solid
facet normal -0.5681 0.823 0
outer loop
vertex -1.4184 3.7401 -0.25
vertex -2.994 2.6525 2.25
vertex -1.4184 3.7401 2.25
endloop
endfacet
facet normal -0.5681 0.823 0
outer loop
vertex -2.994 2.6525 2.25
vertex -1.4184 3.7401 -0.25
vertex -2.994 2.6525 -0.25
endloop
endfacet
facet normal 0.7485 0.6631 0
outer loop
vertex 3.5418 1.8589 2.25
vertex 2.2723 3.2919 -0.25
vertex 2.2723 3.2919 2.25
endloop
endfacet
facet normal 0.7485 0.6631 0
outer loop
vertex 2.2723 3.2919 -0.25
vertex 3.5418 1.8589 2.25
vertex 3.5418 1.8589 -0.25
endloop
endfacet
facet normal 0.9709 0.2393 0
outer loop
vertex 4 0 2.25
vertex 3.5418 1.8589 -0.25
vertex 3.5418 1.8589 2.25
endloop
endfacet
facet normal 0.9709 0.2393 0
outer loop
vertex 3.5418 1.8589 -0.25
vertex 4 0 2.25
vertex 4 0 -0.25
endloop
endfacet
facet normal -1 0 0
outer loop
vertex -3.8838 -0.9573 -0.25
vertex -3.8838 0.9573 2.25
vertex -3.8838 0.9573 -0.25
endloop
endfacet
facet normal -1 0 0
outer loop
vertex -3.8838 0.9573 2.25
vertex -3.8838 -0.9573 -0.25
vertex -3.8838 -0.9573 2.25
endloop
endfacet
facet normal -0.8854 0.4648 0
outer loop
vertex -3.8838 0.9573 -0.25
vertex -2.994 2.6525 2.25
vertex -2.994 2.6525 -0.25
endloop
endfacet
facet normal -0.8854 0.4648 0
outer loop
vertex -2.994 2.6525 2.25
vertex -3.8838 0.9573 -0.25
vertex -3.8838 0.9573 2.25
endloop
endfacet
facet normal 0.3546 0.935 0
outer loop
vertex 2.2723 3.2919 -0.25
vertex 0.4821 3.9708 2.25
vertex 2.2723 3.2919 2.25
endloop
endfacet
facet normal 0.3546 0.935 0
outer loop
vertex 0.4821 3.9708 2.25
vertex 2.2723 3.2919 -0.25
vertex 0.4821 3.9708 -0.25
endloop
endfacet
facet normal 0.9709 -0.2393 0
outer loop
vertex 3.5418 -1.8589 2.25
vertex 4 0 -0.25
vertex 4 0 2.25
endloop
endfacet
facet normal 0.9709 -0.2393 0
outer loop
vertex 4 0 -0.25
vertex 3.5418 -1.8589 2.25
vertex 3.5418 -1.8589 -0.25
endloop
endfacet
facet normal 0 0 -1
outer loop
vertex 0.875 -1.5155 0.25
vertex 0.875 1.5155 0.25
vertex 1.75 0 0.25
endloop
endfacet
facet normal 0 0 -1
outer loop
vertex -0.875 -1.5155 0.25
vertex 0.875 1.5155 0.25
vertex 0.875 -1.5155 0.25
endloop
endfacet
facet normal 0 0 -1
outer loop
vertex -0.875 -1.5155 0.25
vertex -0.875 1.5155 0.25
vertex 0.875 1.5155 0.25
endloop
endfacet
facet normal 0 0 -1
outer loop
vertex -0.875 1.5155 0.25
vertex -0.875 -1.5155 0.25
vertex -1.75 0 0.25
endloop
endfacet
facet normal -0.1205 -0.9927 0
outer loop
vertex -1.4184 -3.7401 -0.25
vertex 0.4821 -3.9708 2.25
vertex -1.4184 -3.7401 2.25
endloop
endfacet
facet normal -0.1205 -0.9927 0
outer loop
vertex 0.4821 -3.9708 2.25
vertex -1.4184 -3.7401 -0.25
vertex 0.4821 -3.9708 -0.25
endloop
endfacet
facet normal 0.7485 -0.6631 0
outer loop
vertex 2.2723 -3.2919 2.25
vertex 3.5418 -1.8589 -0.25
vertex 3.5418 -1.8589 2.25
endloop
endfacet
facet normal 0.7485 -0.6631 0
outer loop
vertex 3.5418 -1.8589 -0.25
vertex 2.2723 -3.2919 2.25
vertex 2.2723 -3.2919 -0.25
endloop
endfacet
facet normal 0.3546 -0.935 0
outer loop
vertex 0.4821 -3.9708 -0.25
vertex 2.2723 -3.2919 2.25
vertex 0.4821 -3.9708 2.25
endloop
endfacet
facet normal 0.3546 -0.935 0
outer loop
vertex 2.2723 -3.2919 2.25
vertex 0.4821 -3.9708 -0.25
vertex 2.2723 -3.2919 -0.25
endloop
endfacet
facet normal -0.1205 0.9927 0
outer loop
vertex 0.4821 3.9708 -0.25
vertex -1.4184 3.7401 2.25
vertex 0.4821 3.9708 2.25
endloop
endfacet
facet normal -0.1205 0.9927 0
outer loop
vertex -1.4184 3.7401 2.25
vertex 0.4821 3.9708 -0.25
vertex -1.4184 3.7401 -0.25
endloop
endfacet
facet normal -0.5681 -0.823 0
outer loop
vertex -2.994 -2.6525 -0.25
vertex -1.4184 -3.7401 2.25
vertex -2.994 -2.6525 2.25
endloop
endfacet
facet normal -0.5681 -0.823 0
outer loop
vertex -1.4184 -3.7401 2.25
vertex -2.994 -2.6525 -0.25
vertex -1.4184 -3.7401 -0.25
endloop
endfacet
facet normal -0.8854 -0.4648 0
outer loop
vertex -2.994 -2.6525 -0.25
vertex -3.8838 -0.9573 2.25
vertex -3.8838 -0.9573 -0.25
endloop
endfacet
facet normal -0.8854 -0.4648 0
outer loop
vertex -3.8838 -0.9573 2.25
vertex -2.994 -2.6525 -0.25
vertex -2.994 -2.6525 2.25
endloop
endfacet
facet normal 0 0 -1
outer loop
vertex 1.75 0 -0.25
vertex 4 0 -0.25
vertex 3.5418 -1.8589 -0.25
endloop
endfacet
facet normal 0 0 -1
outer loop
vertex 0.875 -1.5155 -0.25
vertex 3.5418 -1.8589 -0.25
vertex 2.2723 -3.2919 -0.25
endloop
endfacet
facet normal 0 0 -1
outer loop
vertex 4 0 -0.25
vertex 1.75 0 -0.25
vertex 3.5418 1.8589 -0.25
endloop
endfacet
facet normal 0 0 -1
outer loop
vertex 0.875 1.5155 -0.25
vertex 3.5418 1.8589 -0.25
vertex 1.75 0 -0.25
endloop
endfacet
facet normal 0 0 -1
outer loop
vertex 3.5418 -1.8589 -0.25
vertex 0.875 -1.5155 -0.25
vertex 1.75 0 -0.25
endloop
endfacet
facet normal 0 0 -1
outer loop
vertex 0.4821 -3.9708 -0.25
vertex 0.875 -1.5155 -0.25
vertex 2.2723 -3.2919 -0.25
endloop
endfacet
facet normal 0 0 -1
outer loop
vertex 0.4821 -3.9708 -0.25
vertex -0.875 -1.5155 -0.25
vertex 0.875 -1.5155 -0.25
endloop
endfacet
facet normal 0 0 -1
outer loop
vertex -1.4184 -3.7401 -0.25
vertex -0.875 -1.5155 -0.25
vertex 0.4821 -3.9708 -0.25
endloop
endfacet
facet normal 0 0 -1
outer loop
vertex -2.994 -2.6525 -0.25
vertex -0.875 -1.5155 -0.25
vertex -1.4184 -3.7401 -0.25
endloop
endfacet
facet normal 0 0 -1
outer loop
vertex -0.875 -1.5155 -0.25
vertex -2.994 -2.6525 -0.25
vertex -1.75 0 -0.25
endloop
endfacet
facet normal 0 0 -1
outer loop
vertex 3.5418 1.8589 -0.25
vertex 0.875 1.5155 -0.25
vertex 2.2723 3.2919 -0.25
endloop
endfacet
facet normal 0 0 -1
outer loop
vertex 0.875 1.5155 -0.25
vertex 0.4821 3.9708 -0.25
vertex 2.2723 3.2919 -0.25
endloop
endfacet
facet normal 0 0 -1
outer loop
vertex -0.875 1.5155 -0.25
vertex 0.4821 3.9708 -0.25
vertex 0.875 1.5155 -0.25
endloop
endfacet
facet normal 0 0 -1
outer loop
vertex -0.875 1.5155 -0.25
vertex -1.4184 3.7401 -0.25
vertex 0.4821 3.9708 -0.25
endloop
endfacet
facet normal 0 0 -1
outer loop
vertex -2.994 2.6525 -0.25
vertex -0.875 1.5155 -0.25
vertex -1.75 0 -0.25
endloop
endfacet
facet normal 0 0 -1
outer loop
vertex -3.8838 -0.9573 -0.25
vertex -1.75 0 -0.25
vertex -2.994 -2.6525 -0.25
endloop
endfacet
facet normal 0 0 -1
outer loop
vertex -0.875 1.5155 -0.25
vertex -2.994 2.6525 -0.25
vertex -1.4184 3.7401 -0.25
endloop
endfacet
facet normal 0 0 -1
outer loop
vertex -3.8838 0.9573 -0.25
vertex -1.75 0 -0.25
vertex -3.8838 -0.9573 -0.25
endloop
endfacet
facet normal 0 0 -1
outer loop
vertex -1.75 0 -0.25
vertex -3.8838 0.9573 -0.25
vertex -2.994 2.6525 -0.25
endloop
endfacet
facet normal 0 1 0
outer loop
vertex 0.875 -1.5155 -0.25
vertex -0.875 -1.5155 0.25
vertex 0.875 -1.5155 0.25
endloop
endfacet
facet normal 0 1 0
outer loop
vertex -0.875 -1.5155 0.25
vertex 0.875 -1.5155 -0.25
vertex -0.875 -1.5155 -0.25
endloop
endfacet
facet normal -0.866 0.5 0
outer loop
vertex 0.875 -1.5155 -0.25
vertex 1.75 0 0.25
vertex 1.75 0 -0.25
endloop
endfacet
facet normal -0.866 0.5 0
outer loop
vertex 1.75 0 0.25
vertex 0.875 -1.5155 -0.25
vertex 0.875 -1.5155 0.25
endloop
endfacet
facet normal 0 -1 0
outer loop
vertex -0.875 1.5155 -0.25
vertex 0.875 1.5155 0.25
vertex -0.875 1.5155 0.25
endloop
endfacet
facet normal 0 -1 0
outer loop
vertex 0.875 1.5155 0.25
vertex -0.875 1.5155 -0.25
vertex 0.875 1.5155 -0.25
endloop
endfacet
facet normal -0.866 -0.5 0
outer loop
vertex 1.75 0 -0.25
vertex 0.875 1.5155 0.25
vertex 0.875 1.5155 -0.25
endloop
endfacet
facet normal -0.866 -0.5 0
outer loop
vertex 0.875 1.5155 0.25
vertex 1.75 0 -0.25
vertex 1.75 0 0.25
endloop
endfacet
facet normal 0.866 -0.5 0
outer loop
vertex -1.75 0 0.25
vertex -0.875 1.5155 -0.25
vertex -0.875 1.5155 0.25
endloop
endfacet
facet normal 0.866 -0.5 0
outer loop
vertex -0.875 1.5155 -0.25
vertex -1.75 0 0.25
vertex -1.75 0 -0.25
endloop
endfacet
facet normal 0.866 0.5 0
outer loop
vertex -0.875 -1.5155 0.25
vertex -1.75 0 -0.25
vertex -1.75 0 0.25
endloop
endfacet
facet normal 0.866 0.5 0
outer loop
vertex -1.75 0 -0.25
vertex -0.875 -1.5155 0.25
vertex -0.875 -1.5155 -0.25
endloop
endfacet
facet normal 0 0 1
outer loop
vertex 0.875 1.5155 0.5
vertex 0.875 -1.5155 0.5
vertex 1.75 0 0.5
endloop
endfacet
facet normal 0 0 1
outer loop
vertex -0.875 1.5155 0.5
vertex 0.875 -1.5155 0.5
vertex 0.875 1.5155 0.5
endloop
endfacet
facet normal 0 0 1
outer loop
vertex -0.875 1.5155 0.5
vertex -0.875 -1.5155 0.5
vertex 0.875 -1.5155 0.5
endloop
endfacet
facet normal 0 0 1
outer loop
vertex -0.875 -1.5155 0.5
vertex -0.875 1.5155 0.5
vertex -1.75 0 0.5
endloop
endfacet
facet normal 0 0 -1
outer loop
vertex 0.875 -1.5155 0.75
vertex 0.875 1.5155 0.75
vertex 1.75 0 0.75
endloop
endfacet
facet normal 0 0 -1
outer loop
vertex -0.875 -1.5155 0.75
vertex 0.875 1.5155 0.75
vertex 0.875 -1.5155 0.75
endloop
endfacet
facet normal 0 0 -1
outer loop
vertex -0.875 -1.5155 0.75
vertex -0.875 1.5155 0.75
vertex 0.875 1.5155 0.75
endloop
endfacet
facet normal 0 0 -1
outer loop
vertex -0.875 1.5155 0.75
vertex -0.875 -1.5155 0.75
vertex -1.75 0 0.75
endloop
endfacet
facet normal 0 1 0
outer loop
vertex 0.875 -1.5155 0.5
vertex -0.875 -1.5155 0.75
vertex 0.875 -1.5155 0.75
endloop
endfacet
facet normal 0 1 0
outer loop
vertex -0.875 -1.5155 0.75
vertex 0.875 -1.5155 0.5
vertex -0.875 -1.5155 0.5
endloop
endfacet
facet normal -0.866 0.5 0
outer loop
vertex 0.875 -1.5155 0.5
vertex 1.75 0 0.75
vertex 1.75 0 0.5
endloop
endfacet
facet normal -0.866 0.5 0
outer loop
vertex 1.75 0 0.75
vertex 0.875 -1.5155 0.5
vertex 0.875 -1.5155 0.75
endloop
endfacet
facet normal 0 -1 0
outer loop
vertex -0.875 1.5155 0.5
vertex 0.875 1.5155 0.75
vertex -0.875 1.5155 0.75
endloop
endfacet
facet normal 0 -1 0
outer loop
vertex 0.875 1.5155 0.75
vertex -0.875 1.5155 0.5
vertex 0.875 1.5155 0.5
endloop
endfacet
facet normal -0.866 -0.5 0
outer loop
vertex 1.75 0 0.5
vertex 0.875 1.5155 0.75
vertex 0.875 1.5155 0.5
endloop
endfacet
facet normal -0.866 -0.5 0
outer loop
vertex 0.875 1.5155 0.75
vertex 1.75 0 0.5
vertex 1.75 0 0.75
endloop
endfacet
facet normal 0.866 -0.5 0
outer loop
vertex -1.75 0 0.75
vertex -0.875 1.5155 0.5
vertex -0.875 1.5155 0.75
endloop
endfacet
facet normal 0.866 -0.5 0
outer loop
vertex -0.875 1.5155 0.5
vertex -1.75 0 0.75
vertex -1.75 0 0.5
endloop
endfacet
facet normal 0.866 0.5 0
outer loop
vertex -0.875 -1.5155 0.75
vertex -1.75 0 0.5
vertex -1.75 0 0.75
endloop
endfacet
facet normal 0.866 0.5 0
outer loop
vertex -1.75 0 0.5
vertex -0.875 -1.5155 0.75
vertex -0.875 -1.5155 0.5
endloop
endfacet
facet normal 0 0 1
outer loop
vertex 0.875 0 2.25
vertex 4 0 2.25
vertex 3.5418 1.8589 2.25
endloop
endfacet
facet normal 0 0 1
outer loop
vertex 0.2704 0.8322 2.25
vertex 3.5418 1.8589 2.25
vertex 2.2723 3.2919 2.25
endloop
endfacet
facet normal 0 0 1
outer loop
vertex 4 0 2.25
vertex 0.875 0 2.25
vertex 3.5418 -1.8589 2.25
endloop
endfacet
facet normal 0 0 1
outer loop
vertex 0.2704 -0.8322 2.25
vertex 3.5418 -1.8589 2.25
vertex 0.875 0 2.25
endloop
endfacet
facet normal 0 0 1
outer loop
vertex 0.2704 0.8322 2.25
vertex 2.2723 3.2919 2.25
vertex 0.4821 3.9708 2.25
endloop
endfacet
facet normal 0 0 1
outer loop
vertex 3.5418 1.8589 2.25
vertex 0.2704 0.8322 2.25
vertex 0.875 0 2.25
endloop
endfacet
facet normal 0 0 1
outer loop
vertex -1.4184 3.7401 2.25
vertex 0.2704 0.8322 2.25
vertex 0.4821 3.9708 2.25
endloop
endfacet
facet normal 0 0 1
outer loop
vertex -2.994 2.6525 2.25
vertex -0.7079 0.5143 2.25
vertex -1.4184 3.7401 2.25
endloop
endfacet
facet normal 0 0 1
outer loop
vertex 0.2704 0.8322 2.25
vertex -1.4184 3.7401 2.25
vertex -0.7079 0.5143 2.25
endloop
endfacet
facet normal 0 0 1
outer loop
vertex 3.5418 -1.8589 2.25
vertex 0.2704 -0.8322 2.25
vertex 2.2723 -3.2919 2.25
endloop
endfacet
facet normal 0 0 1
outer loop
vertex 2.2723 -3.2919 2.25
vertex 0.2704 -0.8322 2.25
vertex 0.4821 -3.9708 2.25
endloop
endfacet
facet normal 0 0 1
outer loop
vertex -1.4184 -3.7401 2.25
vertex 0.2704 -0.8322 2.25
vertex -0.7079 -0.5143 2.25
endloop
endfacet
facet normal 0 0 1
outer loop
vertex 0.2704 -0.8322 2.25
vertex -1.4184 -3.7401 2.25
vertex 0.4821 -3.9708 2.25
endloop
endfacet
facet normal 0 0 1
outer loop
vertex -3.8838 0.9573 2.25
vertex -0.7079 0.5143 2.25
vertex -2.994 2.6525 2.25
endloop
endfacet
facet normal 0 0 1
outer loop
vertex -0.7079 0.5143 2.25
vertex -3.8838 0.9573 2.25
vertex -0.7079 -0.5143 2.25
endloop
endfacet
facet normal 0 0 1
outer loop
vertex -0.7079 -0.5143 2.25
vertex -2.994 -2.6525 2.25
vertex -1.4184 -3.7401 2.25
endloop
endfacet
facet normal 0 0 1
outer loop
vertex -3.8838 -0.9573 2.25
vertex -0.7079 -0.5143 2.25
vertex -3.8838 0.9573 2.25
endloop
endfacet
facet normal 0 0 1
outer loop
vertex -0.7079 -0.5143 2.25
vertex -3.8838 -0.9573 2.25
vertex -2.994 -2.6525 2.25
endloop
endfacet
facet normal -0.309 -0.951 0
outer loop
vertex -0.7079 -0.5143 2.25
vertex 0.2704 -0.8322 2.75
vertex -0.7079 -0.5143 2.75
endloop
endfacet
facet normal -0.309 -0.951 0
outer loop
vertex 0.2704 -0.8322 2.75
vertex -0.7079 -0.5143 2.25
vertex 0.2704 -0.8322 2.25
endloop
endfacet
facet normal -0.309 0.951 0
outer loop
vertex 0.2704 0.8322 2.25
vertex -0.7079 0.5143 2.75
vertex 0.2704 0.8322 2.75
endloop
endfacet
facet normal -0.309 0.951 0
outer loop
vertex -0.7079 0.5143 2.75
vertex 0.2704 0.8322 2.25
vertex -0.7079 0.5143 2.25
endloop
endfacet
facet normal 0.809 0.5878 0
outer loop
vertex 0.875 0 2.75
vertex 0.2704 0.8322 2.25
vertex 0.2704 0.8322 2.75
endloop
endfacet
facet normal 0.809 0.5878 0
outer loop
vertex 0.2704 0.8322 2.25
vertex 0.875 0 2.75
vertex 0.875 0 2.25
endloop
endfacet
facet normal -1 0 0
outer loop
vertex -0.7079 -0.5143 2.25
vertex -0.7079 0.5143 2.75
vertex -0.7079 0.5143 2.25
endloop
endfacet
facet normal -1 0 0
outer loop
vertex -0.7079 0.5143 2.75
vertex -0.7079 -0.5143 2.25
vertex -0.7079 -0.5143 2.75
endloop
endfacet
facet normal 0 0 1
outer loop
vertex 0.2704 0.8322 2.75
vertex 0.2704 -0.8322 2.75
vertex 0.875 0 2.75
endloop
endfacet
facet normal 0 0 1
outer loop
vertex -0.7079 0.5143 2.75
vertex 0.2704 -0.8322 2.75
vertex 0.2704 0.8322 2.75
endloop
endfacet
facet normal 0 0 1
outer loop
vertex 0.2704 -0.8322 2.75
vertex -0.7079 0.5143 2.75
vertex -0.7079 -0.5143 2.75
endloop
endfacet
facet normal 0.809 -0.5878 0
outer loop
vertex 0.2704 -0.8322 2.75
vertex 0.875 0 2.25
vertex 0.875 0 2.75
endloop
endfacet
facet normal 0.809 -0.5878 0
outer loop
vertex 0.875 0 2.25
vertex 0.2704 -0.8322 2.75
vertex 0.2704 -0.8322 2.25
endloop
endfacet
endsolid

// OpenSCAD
// Parameters
inner_diameter_mm = 3.5; //[1.75:7:0.1]
outer_diameter_mm = 8; //[4:16:0.1]
thickness_mm = 0.5; //[0.25:1:0.05]
eps_mm = 0.2; //[0.05:0.5:0.05]

// Washer - base geometry
module washer_ring_body() {
  difference() {
    cylinder(r=outer_diameter_mm/2, h=thickness_mm, center=true);
    cylinder(r=inner_diameter_mm/2, h=thickness_mm + 2*eps_mm, center=true);
  }
}

// Round Grommet Top - detailed geometry
module round_grommet_top() {
  color("Silver") {
    union() {
      washer_ring_body();
      translate([0, 0, thickness_mm/2]) {
        cylinder(r=outer_diameter_mm/2, h=thickness_mm/2, center=false);
      }
    }
  }
}

// Round Grommet Assembly - detailed geometry
module round_grommet_assembly() {
  color("DimGray") {
    union() {
      round_grommet_top();
      translate([0, 0, thickness_mm]) {
        cylinder(r=outer_diameter_mm/2, h=thickness_mm/2, center=false);
      }
    }
  }
}

// Nut And Washer - detailed geometry
module nut_and_washer() {
  color("Black") {
    union() {
      washer_ring_body();
      translate([0, 0, thickness_mm/2]) {
        cylinder(r=outer_diameter_mm/2, h=thickness_mm/2, center=false);
      }
      translate([0, 0, thickness_mm]) {
        cylinder(r=outer_diameter_mm/2, h=thickness_mm/2, center=false);
      }
    }
  }
}

// Screw And Washer - detailed geometry
module screw_and_washer() {
  color("Silver") {
    union() {
      washer_ring_body();
      translate([0, 0, thickness_mm/2]) {
        cylinder(r=outer_diameter_mm/2, h=thickness_mm/2, center=false);
      }
      translate([0, 0, thickness_mm]) {
        cylinder(r=outer_diameter_mm/2, h=thickness_mm/2, center=false);
      }
      translate([0, 0, thickness_mm + thickness_mm/2]) {
        cylinder(r=inner_diameter_mm/4, h=thickness_mm, center=false);
      }
    }
  }
}

// Assembly - combines all parts
module assembly() {
  translate([0, 0, 0]) round_grommet_top();
  translate([0, 0, thickness_mm]) round_grommet_assembly();
  translate([0, 0, 2*thickness_mm]) nut_and_washer();
  translate([0, 0, 3*thickness_mm]) screw_and_washer();
}

assembly();
